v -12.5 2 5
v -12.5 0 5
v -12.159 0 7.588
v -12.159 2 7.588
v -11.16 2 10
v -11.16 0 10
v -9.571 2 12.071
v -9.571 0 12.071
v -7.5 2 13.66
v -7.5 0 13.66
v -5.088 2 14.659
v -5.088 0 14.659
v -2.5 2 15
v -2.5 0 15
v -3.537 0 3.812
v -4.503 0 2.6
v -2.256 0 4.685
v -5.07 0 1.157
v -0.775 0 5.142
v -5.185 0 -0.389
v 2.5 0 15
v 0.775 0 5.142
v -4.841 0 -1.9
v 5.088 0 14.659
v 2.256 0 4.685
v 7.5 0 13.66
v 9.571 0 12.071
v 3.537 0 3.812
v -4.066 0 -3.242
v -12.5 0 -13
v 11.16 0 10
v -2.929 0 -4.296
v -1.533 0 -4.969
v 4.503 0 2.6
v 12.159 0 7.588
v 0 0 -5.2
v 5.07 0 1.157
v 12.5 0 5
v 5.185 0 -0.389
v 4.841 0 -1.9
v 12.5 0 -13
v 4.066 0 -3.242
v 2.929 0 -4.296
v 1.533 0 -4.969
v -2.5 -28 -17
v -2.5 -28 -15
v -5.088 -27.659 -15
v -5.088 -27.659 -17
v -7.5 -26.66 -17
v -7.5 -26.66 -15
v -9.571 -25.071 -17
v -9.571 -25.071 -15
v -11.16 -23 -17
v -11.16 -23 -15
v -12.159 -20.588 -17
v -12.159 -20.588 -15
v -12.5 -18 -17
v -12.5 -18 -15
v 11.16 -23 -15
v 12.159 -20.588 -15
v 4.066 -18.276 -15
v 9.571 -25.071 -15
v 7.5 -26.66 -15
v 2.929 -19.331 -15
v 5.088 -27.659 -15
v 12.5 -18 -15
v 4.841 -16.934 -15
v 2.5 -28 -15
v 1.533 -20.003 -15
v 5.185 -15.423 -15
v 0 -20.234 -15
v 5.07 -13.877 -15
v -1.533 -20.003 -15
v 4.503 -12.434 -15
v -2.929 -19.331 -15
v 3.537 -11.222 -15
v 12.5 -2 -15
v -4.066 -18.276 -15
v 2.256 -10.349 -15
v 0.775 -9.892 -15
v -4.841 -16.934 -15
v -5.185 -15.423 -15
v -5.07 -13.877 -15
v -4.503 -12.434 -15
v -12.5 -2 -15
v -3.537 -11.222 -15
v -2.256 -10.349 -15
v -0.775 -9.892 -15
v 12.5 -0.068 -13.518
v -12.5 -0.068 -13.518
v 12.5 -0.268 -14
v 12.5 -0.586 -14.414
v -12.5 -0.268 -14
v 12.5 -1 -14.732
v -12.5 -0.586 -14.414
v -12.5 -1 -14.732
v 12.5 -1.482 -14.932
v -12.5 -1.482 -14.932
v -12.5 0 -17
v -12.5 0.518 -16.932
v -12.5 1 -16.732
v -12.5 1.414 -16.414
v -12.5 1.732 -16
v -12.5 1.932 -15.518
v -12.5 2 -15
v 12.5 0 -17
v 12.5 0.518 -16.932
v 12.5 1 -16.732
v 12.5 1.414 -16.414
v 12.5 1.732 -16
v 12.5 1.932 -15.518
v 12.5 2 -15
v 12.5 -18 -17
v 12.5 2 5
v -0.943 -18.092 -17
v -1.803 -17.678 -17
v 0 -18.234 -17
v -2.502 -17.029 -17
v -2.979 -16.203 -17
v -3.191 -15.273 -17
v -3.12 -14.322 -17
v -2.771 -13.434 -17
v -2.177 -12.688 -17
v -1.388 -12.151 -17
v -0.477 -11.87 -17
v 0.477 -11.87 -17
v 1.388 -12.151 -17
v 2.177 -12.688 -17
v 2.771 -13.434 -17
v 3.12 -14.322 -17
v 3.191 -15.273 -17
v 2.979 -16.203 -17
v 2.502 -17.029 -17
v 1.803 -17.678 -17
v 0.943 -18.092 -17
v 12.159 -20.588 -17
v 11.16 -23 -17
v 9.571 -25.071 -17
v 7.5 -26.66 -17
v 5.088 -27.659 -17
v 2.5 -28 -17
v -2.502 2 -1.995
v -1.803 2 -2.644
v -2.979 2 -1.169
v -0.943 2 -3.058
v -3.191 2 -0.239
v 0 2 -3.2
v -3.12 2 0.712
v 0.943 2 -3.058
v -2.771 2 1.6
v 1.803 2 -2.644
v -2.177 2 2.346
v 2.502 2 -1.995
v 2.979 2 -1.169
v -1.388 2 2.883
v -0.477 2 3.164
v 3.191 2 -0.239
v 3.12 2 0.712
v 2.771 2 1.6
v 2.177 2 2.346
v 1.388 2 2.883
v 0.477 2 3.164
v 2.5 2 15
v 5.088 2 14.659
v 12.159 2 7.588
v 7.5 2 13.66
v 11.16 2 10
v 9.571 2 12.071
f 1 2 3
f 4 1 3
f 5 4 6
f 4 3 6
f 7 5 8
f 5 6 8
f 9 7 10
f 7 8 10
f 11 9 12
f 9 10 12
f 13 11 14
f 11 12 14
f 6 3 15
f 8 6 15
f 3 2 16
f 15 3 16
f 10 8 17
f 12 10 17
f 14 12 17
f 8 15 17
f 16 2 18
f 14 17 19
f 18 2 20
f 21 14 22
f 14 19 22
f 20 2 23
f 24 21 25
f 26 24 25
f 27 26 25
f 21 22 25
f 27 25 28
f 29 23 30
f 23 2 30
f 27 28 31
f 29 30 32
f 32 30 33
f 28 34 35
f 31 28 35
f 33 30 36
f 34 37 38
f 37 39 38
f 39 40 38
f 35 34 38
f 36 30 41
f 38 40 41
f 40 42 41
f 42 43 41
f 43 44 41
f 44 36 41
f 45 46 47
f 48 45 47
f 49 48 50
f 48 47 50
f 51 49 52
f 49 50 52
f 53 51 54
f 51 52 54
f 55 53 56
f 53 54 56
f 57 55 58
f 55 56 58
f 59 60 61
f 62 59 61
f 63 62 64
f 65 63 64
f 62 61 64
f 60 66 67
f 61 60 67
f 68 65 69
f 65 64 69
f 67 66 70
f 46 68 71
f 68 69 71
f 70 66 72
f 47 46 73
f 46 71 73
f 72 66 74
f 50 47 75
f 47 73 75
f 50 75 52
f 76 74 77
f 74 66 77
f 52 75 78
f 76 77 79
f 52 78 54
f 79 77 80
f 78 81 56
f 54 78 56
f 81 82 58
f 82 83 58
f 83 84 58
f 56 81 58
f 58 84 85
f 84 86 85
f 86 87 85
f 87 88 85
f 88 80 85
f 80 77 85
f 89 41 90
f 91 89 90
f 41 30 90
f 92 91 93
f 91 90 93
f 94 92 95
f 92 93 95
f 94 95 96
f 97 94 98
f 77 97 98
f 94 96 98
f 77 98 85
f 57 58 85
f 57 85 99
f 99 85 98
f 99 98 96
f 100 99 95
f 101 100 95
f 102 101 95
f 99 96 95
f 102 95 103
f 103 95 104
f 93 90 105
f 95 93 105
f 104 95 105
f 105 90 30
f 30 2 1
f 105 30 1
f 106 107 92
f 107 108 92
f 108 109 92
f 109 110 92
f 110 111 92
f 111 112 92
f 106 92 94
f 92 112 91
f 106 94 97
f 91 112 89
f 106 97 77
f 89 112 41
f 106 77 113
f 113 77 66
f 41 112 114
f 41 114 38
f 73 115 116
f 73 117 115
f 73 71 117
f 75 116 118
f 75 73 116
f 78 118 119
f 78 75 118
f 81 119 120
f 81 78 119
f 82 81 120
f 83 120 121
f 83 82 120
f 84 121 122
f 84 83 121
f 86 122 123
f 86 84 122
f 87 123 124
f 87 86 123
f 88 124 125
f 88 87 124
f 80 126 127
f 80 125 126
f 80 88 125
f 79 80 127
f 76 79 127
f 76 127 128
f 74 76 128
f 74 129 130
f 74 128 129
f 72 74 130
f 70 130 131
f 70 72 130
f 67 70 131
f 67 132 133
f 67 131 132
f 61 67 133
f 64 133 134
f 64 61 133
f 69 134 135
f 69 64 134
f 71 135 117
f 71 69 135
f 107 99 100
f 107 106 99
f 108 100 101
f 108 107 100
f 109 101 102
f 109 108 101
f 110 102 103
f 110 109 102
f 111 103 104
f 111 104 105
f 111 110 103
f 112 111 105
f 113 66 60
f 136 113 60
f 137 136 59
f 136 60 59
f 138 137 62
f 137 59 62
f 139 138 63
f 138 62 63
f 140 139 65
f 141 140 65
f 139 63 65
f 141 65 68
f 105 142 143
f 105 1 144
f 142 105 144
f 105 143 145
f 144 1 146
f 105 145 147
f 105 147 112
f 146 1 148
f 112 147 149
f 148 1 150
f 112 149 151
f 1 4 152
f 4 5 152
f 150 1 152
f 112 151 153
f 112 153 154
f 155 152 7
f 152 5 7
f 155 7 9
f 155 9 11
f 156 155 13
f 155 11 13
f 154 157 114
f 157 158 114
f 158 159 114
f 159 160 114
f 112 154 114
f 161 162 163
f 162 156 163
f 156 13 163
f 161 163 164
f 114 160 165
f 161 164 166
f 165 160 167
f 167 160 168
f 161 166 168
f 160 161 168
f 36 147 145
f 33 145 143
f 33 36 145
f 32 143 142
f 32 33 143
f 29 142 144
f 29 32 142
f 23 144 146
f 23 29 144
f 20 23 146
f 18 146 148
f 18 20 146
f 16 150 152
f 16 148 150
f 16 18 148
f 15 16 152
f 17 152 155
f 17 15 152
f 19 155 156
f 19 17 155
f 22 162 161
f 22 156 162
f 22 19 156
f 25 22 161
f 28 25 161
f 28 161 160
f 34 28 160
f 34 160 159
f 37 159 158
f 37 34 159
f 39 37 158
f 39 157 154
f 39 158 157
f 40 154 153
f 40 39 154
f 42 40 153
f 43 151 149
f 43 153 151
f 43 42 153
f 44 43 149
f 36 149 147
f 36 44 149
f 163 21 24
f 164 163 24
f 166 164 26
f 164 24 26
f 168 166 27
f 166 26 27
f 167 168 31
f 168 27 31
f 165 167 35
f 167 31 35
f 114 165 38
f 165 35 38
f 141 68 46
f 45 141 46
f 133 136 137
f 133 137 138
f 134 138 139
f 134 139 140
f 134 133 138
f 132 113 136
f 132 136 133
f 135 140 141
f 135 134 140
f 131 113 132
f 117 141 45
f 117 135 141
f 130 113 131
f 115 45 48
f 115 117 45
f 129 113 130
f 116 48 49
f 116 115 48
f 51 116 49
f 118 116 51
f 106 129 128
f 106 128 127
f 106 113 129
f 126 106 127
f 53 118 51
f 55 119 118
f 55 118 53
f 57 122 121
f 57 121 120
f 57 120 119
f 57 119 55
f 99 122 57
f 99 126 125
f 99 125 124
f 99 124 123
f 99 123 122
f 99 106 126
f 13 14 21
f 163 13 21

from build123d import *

# Parameters (mm, degrees)
EXTRUDE_1_DEPTH = 2
EXTRUDE_2_DEPTH = 2
FILLET_1_R      = 2
FILLET_2_R      = 2


with BuildPart() as part:
    # Эскиз1 → Бобышка-Вытянуть1 (new body)
    with BuildSketch(Plane(origin=(0, 0, 0), x_dir=(1, 0, 0), z_dir=(0, 1, 0))):
        with BuildLine():
            Line((-2.5, -15), (2.5, -15))
            ThreePointArc((2.5, -15), (9.571067812, -12.071067812), (12.5, -5))
            Line((12.5, -5), (12.5, 15))
            Line((12.5, 15), (-12.5, 15))
            Line((-12.5, 15), (-12.5, -5))
            ThreePointArc((-12.5, -5), (-9.571067812, -12.071067812), (-2.5, -15))
        make_face()
    extrude(amount=EXTRUDE_1_DEPTH)

    # Эскиз3 → Бобышка-Вытянуть2 (add)
    with BuildSketch(Plane(origin=(0, 0, -15), x_dir=(-1, 0, 0), z_dir=(0, 0, -1))):
        with BuildLine():
            Line((-2.5, -28), (2.5, -28))
            ThreePointArc((2.5, -28), (9.571067812, -25.071067812), (12.5, -18))
            Line((12.5, -18), (12.5, 2))
            Line((12.5, 2), (-12.5, 2))
            Line((-12.5, 2), (-12.5, -18))
            ThreePointArc((-12.5, -18), (-9.571067812, -25.071067812), (-2.5, -28))
        make_face()
    extrude(amount=EXTRUDE_2_DEPTH)

    # Скругление1
    fillet_1_edges = [part.edges().sort_by_distance(p)[0] for p in [
        (0, 0, -15),
    ]]
    fillet(fillet_1_edges, radius=FILLET_1_R)

    # Скругление2
    fillet_2_edges = [part.edges().sort_by_distance(p)[0] for p in [
        (0, 2, -17),
    ]]
    fillet(fillet_2_edges, radius=FILLET_2_R)

    # Эскиз7 → Зенковка для винта с полупотайной головкой M52 (revolve, cut)
    with BuildSketch(Plane(origin=(0, -15.034247801, -15), x_dir=(0, -1, 0), z_dir=(1, 0, 0))):
        Polygon((0, 0), (0, 2), (2.75, 2), (2.75, 2.45), (5.2, 0), align=None)
    revolve(axis=Axis((0, -15.034247801, -8.65), (0, 0, -1)), mode=Mode.SUBTRACT)

    # Эскиз9 → Зенковка для винта с полупотайной головкой M53 (revolve, cut)
    with BuildSketch(Plane(origin=(0, 0, 0), x_dir=(0, 0, -1), z_dir=(1, 0, 0))):
        Polygon((0, 0), (0, 2), (2.75, 2), (2.75, 2.45), (5.2, 0), align=None)
    revolve(axis=Axis((0, -6.35, 0), (0, 1, 0)), mode=Mode.SUBTRACT)


solid = part.part
